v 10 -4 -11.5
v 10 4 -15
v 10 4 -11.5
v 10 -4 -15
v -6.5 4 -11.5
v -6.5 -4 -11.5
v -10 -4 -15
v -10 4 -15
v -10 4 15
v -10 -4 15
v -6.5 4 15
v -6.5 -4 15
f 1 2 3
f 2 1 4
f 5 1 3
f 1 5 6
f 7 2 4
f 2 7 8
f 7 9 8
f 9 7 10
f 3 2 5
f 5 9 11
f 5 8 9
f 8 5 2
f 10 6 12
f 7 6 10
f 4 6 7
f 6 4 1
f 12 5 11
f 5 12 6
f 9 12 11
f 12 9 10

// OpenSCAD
// Auto-generated from tests/data/feature_fixtures_manifest.json
// fixture: l_bracket_tall
// fixture_type: l_bracket
// description: Tall L-bracket (20x8x30 envelope, leg_thickness=3.5). High Z/X aspect ratio variant.
$fn = 96;

bracket_size = [20.000000, 8.000000, 30.000000];
leg_thickness = 3.500000;
bracket_origin = [-10.000000, -4.000000, -15.000000];

union() {
  translate(bracket_origin) cube([bracket_size[0], bracket_size[1], leg_thickness]);
  translate(bracket_origin) cube([leg_thickness, bracket_size[1], bracket_size[2]]);
}
